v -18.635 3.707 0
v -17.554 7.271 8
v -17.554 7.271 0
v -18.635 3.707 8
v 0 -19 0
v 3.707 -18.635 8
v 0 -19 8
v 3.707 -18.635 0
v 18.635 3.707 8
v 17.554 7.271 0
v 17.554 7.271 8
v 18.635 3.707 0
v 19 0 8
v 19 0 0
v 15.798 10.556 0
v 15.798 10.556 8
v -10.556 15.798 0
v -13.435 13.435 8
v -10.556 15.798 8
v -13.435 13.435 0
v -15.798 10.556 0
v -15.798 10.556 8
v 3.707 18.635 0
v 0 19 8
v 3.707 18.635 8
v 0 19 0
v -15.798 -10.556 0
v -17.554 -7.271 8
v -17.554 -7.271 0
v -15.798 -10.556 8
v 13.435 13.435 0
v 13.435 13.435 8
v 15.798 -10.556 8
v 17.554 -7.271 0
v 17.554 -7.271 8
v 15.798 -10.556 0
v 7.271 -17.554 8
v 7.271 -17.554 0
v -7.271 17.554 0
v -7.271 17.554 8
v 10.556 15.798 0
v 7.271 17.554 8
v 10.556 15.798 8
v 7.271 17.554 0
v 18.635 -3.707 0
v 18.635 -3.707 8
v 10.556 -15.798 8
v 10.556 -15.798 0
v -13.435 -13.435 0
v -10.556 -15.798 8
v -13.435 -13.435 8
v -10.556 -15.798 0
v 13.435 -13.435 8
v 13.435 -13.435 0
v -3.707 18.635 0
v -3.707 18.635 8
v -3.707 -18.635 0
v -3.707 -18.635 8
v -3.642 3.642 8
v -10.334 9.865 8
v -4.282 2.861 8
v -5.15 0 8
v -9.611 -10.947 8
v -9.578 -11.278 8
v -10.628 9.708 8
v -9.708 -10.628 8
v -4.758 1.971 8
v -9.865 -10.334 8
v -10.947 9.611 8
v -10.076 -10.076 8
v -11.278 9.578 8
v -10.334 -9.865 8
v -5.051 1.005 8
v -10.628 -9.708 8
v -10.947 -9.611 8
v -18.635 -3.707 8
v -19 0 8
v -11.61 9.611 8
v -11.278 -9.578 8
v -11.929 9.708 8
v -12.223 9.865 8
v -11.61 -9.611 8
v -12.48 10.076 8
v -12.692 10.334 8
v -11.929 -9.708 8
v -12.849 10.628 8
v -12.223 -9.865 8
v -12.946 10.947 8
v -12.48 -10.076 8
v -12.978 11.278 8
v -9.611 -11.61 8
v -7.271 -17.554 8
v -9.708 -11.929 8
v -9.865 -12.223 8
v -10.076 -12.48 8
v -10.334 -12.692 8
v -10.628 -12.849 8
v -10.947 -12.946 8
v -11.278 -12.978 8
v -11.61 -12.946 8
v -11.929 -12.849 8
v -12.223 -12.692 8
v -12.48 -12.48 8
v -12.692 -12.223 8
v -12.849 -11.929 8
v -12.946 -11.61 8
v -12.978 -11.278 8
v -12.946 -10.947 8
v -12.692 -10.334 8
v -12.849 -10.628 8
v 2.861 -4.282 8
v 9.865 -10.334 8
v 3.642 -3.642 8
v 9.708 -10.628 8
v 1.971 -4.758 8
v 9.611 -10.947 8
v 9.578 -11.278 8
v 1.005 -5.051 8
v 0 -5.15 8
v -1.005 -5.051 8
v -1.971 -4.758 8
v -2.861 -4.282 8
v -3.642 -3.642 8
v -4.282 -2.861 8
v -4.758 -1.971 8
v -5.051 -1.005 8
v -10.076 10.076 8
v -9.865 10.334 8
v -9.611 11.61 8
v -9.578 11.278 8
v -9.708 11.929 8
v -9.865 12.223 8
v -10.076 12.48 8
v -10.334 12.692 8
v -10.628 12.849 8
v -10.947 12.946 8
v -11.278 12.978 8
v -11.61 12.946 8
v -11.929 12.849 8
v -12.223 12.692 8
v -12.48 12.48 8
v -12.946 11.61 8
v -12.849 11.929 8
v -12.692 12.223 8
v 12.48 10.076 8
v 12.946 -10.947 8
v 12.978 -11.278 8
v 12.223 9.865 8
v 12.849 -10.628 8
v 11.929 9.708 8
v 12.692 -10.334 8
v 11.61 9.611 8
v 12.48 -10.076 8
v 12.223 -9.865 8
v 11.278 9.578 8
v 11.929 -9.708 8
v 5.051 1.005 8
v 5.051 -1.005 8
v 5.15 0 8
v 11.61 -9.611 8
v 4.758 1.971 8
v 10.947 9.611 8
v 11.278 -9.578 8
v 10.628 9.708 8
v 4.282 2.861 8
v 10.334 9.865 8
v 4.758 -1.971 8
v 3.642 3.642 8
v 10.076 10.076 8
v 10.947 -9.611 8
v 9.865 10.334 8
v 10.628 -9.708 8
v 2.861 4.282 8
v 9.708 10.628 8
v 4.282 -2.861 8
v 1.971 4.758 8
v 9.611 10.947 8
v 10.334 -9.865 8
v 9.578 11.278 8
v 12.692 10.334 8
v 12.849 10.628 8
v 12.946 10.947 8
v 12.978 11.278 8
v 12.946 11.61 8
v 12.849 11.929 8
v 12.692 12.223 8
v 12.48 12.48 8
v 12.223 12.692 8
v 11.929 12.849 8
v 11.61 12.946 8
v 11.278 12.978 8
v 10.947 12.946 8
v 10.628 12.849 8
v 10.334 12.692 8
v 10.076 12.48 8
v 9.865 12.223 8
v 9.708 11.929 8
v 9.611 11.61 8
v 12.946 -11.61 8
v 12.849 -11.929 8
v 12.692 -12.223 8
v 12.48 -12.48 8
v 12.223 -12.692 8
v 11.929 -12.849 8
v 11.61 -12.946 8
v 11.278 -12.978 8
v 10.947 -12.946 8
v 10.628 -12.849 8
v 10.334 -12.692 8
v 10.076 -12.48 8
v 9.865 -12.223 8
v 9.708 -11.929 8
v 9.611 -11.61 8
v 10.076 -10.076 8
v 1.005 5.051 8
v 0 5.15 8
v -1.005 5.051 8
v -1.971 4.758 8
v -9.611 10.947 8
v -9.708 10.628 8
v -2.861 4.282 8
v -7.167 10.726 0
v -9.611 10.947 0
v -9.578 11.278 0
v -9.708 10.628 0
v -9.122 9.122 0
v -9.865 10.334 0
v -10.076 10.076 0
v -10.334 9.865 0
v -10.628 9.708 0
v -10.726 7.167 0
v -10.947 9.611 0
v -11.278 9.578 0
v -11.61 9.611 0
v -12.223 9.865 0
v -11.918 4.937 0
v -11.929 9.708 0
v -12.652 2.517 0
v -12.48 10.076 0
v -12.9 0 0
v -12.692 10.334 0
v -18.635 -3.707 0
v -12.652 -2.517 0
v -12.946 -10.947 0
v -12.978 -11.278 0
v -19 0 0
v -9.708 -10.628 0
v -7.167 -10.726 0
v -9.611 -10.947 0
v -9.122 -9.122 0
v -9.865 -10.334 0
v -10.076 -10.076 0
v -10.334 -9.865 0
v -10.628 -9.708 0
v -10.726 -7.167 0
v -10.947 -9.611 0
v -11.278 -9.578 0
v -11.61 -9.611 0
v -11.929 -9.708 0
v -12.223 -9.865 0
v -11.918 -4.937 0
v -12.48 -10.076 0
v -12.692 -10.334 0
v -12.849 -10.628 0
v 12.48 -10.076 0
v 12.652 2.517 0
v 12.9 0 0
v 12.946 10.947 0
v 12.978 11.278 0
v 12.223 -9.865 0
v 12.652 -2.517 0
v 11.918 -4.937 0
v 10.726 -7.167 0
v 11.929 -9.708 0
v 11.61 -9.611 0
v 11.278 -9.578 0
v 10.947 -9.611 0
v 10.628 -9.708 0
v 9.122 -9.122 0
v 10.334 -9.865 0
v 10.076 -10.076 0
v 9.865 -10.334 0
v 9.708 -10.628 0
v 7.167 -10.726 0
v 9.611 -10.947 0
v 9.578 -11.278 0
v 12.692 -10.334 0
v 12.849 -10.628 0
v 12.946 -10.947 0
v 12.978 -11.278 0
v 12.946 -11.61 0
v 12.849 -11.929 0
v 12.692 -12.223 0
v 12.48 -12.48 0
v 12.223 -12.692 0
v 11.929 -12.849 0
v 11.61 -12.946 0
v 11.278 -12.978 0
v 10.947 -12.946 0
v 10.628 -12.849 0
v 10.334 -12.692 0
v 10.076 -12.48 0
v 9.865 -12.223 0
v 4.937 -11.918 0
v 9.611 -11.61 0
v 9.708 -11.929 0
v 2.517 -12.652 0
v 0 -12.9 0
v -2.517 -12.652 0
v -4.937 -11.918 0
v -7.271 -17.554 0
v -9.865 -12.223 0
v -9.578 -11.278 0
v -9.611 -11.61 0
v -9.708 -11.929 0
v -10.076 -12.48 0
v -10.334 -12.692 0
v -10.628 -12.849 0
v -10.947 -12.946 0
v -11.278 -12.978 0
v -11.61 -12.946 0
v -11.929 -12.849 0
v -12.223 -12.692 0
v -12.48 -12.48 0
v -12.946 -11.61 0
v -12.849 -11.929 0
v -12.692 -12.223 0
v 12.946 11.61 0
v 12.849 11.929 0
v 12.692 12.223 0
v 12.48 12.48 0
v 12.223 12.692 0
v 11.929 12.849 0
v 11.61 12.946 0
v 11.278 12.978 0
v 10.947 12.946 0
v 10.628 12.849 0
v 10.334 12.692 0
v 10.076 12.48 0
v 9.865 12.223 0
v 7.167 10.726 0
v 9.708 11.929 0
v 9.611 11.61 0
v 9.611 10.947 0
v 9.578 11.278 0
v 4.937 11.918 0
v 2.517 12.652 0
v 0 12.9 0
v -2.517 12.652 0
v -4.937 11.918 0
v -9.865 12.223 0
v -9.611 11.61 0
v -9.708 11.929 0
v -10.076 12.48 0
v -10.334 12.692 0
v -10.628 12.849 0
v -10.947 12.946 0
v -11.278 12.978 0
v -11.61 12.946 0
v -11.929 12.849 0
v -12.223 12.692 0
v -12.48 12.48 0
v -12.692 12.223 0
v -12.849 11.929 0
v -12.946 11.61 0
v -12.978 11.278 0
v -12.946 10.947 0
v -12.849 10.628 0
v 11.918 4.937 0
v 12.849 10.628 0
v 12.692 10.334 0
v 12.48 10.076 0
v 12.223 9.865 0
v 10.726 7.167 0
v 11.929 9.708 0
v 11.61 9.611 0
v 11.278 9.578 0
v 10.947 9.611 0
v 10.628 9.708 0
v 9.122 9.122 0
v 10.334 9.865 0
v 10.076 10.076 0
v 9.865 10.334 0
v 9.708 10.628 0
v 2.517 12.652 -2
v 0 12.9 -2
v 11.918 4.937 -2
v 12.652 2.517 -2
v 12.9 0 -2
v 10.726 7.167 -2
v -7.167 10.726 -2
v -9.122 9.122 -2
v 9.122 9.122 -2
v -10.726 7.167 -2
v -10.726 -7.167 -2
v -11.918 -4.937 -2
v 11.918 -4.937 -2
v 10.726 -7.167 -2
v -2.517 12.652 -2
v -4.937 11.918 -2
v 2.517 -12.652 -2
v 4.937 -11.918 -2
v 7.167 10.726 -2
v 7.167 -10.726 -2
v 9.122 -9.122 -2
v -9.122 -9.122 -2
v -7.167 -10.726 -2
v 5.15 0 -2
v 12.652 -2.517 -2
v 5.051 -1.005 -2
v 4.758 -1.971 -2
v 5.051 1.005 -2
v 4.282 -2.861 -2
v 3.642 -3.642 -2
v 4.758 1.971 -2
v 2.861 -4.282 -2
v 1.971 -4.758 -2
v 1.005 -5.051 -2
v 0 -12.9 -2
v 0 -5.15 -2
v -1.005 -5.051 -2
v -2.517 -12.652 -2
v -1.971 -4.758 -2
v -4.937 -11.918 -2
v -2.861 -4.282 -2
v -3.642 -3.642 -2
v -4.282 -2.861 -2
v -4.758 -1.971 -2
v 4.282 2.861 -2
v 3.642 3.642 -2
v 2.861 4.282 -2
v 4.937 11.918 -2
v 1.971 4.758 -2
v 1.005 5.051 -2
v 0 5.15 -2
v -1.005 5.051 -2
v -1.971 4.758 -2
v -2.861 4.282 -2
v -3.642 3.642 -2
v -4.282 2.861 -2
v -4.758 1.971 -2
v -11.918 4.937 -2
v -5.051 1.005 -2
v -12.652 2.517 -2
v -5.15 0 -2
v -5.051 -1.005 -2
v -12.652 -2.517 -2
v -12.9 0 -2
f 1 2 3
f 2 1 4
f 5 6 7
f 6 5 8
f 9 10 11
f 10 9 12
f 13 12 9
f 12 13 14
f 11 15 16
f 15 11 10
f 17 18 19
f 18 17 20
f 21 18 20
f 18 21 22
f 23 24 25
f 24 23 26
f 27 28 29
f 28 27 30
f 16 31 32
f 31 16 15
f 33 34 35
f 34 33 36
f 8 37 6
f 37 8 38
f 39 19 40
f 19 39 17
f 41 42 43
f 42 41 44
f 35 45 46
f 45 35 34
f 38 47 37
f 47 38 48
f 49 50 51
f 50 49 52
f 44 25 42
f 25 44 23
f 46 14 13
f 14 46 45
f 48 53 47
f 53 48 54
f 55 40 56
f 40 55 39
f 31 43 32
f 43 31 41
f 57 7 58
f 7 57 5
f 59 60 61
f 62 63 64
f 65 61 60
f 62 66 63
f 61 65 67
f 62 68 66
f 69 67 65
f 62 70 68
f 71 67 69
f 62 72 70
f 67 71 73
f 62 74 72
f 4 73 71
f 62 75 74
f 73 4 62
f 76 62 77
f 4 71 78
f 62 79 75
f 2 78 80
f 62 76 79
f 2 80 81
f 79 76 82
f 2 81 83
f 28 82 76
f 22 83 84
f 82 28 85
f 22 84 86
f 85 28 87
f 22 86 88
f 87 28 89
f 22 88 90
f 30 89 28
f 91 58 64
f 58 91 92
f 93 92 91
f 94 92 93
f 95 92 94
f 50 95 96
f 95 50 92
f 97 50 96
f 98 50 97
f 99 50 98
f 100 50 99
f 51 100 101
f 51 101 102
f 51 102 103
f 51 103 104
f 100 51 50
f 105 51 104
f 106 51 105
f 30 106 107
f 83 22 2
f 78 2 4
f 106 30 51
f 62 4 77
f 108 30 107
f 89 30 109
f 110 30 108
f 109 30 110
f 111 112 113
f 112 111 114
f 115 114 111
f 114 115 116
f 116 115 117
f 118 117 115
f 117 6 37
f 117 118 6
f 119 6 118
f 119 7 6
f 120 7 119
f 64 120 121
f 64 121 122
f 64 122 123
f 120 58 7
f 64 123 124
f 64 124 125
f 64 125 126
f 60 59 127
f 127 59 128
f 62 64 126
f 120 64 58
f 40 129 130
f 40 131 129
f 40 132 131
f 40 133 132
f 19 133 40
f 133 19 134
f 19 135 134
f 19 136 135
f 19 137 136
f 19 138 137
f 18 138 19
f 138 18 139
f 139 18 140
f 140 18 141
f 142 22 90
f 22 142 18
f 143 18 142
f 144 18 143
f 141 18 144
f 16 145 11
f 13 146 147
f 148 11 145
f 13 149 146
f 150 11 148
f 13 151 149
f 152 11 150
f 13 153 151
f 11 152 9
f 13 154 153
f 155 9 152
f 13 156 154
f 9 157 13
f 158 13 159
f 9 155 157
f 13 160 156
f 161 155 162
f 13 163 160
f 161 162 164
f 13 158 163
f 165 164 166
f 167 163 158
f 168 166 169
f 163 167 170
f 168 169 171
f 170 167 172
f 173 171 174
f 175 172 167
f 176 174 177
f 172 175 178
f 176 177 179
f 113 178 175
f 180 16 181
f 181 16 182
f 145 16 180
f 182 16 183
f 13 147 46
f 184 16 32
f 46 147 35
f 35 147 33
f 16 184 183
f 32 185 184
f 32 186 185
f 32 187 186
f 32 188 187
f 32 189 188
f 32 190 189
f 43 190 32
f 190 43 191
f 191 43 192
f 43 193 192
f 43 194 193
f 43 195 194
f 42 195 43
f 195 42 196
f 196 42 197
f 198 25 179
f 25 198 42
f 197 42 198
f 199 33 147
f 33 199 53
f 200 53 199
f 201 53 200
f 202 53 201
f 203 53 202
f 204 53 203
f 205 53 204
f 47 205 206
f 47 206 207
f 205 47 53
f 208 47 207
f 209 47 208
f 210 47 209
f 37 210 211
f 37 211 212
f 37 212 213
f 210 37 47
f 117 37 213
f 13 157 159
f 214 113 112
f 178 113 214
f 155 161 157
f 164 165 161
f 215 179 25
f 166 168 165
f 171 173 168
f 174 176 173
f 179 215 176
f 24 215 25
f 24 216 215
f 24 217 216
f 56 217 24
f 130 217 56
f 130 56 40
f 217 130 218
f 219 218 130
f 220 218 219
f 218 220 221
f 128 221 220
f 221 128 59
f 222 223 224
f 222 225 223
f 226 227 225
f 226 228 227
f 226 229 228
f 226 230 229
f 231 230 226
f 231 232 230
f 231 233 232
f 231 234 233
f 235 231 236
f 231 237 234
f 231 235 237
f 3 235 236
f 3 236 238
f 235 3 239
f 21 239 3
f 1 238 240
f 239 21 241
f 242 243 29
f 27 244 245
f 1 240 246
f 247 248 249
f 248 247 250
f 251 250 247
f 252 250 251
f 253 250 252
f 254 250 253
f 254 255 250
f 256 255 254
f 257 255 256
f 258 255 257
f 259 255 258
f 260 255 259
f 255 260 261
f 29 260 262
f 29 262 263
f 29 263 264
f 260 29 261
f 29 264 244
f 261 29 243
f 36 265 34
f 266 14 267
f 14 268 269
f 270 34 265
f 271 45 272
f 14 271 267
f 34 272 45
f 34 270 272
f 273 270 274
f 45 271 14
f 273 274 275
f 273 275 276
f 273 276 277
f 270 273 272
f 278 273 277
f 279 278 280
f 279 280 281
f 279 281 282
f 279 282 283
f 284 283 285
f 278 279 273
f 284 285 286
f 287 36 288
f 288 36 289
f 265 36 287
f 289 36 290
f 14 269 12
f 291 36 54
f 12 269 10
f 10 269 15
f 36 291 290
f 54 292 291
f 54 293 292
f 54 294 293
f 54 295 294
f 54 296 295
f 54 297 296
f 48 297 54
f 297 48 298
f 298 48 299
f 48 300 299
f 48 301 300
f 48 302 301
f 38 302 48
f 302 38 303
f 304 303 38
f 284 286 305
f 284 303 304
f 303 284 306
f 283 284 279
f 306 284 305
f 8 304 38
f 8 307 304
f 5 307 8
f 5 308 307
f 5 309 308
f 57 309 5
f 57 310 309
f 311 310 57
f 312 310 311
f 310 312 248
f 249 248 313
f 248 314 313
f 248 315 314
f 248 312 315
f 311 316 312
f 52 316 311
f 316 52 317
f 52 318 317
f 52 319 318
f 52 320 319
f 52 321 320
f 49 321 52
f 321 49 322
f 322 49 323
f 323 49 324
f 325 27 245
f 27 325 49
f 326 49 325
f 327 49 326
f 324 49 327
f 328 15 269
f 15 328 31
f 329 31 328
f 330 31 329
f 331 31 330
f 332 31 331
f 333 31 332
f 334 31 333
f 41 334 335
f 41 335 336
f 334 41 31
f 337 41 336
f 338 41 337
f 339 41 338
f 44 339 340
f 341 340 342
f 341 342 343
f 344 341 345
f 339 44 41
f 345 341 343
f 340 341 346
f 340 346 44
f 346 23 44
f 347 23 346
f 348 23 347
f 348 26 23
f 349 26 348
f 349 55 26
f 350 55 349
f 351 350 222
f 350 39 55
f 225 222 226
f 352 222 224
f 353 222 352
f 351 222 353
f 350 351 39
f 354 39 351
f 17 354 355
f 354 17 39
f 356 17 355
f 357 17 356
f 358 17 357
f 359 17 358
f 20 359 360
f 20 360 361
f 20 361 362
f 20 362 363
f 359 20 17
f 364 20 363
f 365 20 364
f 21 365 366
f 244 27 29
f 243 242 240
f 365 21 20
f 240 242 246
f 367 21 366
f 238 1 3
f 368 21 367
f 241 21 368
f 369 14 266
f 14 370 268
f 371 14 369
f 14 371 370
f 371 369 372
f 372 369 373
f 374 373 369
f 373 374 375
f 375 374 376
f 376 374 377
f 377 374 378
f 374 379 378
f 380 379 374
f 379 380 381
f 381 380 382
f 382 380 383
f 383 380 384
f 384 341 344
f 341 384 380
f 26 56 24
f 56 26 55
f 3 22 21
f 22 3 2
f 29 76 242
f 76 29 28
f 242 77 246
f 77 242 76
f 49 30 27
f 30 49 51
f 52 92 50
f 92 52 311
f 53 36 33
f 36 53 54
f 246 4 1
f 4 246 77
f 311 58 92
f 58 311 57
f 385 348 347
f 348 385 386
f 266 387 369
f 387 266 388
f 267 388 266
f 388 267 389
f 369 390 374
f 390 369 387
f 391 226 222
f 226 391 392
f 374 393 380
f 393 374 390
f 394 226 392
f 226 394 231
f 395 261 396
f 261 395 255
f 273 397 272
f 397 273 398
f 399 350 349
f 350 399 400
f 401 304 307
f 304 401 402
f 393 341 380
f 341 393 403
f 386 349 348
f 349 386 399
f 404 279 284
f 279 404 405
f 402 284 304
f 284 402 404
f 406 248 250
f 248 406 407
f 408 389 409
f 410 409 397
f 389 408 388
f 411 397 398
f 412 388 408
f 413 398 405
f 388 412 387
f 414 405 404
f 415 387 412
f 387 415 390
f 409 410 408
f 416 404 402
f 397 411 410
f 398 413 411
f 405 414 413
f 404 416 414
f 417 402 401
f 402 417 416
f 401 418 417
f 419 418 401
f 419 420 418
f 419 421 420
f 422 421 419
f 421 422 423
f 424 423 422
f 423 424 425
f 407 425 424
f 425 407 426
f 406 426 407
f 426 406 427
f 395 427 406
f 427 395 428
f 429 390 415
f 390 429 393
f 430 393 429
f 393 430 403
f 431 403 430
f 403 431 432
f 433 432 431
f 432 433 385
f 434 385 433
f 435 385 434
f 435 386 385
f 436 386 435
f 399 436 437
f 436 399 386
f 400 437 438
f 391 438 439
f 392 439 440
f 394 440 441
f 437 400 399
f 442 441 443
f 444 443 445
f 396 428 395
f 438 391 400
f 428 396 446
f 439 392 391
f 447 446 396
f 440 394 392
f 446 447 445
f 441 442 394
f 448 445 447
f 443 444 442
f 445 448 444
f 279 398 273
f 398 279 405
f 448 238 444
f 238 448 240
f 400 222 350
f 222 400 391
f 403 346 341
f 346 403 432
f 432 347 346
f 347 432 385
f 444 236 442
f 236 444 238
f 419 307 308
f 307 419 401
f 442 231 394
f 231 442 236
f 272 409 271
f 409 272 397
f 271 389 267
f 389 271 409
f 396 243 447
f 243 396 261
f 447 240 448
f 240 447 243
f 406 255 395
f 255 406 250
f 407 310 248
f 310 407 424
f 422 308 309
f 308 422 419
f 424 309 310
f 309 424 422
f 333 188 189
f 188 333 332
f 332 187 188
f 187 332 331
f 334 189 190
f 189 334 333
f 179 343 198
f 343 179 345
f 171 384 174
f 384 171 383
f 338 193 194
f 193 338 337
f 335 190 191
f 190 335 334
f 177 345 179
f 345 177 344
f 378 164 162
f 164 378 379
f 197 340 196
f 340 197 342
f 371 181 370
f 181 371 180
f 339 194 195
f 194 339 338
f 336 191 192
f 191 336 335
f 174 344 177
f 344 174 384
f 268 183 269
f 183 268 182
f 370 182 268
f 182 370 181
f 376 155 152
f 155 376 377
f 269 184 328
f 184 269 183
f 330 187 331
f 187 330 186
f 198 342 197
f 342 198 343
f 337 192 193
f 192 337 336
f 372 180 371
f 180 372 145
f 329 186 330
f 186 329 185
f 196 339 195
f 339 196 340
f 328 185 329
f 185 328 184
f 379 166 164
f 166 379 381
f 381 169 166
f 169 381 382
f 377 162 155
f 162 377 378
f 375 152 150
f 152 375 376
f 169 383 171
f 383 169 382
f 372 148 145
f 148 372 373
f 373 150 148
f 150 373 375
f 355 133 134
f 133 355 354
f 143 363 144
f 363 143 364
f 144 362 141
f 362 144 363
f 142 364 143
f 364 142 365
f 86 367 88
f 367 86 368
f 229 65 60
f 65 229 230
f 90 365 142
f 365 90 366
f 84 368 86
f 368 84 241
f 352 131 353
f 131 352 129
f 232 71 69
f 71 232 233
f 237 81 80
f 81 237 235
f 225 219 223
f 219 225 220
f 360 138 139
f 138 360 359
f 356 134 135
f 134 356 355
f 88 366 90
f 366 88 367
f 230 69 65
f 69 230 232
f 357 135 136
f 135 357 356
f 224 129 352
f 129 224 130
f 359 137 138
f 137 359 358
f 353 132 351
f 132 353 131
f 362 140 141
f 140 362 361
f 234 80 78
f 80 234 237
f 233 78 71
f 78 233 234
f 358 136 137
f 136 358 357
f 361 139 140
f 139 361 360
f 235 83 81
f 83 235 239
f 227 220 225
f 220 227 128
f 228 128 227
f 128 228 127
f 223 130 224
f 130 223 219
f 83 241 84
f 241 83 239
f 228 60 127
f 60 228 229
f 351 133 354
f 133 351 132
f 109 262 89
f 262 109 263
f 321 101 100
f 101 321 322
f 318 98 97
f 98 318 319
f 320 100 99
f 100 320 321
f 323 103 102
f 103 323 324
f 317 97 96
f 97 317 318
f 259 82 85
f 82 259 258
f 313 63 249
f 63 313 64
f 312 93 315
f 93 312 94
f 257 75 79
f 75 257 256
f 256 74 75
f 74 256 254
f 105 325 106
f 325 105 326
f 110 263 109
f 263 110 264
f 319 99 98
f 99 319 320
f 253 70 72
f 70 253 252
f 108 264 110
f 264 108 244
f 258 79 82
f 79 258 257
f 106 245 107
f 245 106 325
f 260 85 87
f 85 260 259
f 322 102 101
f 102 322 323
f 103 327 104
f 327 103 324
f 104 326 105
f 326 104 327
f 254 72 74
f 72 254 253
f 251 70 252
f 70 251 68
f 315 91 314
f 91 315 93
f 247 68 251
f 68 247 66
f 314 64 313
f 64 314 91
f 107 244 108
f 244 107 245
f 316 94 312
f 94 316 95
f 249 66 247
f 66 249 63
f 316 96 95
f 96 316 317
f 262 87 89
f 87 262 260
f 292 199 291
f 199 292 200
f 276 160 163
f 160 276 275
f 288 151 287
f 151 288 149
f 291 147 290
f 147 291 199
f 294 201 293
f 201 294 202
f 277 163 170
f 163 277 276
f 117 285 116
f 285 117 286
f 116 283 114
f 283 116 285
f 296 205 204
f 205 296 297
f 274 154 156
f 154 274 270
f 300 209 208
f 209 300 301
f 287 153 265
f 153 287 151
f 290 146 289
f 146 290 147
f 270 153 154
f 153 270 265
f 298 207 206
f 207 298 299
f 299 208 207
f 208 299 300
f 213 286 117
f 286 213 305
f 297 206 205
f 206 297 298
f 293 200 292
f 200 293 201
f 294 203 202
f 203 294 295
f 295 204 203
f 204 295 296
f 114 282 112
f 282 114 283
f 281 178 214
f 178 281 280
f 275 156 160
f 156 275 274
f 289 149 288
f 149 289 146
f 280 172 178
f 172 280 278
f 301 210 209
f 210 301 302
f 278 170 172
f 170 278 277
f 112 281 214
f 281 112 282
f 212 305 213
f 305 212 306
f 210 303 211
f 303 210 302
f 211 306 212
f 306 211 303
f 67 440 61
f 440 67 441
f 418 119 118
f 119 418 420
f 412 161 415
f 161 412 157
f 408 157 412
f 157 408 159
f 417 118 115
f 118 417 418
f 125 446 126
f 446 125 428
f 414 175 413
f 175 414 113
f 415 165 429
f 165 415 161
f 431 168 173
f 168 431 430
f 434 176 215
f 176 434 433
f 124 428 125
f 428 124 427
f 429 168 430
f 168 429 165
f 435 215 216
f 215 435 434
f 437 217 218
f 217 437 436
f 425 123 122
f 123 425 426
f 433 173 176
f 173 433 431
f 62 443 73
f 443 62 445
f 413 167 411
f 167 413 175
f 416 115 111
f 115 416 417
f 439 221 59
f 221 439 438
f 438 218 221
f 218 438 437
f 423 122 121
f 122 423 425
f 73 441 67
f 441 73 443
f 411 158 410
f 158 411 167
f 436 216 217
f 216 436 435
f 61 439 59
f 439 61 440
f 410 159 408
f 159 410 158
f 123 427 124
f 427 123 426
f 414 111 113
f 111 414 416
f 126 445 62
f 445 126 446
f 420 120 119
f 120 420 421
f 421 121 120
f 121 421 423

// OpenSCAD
$fn = 32;

// ----------------------------------------------------------------------
// Retaining cap: 6000 cover, 38 mm, spigot 25.8 mm
// ----------------------------------------------------------------------

// --- parameters (mm) ---
plate_d = 38;             // cover diameter
plate_t = 8;              // cover thickness
boss_d = 25.8;            // spigot that enters the housing
boss_h = 2;               // spigot height
shaft_d = 10.3;           // shaft opening
bolt_d = 3.4;             // bolt clearance
bolt_r = 15.95;           // bolt circle radius

module cover() {
  cylinder(h = plate_t, d = plate_d);
}

module spigot() {
  /* sunk 1 mm into the cover; the spigot sets the overall height */
  translate([0, 0, -boss_h]) cylinder(h = boss_h + 1, d = boss_d);
}

difference() {
  union() {
    cover();
    spigot();
  }
  for (i = [0 : 3]) rotate([0, 0, 45 + i * 90]) translate([bolt_r, 0, -boss_h - 1])
    cylinder(h = boss_h + plate_t + 2, d = bolt_d);
  translate([0, 0, -boss_h - 1]) cylinder(h = boss_h + plate_t + 2, d = shaft_d);
}
